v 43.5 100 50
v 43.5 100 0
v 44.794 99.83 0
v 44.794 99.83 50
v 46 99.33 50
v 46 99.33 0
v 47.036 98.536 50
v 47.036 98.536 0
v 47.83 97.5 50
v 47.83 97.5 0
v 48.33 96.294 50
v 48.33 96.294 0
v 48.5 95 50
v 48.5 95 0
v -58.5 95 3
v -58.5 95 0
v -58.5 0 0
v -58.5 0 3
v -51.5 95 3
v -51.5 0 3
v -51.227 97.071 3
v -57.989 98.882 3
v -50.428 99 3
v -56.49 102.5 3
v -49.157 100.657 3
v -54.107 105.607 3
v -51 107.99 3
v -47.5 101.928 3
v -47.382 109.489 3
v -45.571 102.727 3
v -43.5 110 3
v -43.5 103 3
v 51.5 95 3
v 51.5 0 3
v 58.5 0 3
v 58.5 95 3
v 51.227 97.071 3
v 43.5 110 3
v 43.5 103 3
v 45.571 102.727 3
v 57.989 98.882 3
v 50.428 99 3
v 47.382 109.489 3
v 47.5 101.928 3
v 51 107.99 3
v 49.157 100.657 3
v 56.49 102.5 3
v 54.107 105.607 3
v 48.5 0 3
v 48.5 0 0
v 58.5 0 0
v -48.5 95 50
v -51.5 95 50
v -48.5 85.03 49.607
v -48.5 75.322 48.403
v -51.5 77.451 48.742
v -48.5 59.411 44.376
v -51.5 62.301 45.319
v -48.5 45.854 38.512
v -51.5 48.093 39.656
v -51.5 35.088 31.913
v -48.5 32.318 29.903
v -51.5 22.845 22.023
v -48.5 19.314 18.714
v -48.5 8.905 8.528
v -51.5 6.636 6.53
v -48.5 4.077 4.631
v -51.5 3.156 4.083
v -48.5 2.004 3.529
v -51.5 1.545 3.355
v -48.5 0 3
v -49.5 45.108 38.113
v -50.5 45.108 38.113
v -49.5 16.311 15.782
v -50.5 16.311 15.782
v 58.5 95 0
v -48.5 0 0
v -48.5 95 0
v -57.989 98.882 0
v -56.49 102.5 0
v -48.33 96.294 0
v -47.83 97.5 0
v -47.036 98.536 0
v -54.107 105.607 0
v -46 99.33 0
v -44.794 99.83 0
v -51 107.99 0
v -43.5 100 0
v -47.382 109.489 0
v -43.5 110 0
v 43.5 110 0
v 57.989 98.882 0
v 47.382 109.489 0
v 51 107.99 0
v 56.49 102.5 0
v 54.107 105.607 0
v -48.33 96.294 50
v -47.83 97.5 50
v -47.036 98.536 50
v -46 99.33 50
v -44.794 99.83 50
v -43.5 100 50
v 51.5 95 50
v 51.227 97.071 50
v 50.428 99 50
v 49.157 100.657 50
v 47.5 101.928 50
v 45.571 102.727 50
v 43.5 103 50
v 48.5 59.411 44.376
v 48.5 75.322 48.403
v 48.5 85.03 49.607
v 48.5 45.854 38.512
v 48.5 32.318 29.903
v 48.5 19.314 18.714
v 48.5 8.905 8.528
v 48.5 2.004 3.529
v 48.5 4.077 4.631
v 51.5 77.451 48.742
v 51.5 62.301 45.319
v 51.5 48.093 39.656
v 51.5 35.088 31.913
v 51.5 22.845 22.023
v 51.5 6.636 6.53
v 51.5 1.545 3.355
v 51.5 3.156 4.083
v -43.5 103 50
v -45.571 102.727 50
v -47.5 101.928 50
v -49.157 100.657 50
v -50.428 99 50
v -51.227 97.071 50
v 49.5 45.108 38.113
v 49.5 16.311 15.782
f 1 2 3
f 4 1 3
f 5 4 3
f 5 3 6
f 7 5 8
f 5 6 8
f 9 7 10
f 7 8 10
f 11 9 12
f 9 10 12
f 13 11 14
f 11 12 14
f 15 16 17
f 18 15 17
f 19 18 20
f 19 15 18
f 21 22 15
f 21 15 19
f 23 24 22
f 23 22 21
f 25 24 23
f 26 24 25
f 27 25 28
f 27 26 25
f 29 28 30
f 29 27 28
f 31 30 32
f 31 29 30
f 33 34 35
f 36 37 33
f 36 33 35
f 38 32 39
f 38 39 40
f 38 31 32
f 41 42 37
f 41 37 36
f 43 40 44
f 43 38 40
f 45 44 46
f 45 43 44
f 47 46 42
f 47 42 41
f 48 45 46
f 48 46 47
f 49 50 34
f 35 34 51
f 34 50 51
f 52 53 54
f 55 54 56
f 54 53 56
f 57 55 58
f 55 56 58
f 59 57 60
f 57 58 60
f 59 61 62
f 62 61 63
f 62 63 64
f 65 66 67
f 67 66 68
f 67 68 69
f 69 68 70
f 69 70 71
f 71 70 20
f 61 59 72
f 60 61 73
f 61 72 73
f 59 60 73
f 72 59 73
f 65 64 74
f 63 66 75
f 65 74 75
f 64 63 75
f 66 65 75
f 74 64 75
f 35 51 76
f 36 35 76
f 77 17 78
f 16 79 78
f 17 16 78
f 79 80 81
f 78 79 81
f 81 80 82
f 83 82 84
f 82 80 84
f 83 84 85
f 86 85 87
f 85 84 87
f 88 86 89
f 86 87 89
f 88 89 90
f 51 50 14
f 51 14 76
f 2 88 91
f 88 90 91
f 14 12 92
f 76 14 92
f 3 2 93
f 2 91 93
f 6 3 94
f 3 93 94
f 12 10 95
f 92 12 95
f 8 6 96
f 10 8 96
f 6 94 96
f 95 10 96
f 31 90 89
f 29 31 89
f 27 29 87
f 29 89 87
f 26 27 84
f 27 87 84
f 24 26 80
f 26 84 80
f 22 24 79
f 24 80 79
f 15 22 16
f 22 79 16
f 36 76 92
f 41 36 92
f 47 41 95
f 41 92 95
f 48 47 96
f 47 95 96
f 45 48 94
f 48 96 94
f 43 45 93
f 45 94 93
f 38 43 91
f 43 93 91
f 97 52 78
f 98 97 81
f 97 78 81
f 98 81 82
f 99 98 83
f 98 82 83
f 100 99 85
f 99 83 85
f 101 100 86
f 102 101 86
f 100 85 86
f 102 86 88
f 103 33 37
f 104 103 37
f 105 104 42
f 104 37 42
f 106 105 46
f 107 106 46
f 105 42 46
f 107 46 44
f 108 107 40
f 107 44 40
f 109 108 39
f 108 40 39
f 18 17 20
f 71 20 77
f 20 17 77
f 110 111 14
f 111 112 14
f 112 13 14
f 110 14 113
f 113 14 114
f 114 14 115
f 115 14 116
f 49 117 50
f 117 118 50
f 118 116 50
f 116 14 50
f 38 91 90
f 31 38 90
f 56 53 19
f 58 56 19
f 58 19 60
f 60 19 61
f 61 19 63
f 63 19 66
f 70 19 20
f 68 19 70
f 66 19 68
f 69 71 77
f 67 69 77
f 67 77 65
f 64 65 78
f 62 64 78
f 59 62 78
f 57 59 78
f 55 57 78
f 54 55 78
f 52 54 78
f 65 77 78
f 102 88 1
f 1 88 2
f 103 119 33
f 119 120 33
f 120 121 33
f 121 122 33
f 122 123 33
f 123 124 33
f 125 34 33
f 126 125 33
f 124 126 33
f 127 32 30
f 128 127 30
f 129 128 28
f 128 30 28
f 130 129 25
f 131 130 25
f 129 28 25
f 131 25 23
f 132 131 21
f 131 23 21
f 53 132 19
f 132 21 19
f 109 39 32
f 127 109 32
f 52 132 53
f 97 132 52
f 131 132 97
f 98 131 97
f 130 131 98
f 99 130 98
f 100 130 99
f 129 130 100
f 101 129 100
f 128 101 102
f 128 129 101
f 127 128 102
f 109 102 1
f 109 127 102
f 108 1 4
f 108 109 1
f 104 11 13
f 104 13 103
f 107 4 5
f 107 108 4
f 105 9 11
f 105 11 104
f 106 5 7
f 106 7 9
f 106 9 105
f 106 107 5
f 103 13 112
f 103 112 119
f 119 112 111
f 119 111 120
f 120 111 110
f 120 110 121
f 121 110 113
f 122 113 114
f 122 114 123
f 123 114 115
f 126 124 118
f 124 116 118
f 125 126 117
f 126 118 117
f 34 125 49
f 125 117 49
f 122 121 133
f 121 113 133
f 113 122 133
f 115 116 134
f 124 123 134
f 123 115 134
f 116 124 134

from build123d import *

# Parameters (mm, degrees)
F1_DEPTH = 50
F2_DEPTH = 3
F4_DEPTH = 103


with BuildPart() as f1:
    # F0 (on Top) → F1 (new body)
    with BuildSketch(Plane.XY):
        with BuildLine():
            Line((-51.5, 0), (-48.5, 0))
            Line((-48.5, 0), (-48.5, 95))
            ThreePointArc((-48.5, 95), (-47.0355339059, 98.5355339059), (-43.5, 100))
            Line((-43.5, 100), (43.5, 100))
            ThreePointArc((43.5, 100), (47.0355339059, 98.5355339059), (48.5, 95))
            Line((48.5, 95), (48.5, 0))
            Line((48.5, 0), (51.5, 0))
            Line((51.5, 0), (51.5, 95))
            ThreePointArc((51.5, 95), (49.1568542495, 100.6568542495), (43.5, 103))
            Line((43.5, 103), (-43.5, 103))
            ThreePointArc((-43.5, 103), (-49.1568542495, 100.6568542495), (-51.5, 95))
            Line((-51.5, 95), (-51.5, 0))
        make_face()
    extrude(amount=F1_DEPTH)

    # F0 (on Top) → F2 (join)
    with BuildSketch(Plane.XY):
        with BuildLine():
            Line((-58.5, 0), (-51.5, 0))
            Line((-51.5, 0), (-51.5, 95))
            ThreePointArc((-51.5, 95), (-49.1568542495, 100.6568542495), (-43.5, 103))
            Line((-43.5, 103), (43.5, 103))
            ThreePointArc((43.5, 103), (49.1568542495, 100.6568542495), (51.5, 95))
            Line((51.5, 95), (51.5, 0))
            Line((51.5, 0), (58.5, 0))
            Line((58.5, 0), (58.5, 95))
            ThreePointArc((58.5, 95), (54.1066017178, 105.6066017178), (43.5, 110))
            Line((43.5, 110), (-43.5, 110))
            ThreePointArc((-43.5, 110), (-54.1066017178, 105.6066017178), (-58.5, 95))
            Line((-58.5, 95), (-58.5, 0))
        make_face()
    extrude(amount=F2_DEPTH)

    # F3 (on face) → F4 (cut, through all)
    with BuildSketch(Plane(origin=(-51.5, 0, 0), x_dir=(0, -1, 0), z_dir=(-1, 0, 0))):
        with BuildLine():
            Line((0, 50), (-95, 50))
            add(Edge.make_bspline(
                [(-95, 50), (-31.6906612889, 50), (-12.9379844293, 4.3437238783), (0, 3)],
                knots=[0, 0, 0, 0, 105.9905656179, 105.9905656179, 105.9905656179, 105.9905656179], degree=3))
            Line((0, 3), (0, 50))
        make_face()
    extrude(amount=-F4_DEPTH, mode=Mode.SUBTRACT)


solid = f1.part
